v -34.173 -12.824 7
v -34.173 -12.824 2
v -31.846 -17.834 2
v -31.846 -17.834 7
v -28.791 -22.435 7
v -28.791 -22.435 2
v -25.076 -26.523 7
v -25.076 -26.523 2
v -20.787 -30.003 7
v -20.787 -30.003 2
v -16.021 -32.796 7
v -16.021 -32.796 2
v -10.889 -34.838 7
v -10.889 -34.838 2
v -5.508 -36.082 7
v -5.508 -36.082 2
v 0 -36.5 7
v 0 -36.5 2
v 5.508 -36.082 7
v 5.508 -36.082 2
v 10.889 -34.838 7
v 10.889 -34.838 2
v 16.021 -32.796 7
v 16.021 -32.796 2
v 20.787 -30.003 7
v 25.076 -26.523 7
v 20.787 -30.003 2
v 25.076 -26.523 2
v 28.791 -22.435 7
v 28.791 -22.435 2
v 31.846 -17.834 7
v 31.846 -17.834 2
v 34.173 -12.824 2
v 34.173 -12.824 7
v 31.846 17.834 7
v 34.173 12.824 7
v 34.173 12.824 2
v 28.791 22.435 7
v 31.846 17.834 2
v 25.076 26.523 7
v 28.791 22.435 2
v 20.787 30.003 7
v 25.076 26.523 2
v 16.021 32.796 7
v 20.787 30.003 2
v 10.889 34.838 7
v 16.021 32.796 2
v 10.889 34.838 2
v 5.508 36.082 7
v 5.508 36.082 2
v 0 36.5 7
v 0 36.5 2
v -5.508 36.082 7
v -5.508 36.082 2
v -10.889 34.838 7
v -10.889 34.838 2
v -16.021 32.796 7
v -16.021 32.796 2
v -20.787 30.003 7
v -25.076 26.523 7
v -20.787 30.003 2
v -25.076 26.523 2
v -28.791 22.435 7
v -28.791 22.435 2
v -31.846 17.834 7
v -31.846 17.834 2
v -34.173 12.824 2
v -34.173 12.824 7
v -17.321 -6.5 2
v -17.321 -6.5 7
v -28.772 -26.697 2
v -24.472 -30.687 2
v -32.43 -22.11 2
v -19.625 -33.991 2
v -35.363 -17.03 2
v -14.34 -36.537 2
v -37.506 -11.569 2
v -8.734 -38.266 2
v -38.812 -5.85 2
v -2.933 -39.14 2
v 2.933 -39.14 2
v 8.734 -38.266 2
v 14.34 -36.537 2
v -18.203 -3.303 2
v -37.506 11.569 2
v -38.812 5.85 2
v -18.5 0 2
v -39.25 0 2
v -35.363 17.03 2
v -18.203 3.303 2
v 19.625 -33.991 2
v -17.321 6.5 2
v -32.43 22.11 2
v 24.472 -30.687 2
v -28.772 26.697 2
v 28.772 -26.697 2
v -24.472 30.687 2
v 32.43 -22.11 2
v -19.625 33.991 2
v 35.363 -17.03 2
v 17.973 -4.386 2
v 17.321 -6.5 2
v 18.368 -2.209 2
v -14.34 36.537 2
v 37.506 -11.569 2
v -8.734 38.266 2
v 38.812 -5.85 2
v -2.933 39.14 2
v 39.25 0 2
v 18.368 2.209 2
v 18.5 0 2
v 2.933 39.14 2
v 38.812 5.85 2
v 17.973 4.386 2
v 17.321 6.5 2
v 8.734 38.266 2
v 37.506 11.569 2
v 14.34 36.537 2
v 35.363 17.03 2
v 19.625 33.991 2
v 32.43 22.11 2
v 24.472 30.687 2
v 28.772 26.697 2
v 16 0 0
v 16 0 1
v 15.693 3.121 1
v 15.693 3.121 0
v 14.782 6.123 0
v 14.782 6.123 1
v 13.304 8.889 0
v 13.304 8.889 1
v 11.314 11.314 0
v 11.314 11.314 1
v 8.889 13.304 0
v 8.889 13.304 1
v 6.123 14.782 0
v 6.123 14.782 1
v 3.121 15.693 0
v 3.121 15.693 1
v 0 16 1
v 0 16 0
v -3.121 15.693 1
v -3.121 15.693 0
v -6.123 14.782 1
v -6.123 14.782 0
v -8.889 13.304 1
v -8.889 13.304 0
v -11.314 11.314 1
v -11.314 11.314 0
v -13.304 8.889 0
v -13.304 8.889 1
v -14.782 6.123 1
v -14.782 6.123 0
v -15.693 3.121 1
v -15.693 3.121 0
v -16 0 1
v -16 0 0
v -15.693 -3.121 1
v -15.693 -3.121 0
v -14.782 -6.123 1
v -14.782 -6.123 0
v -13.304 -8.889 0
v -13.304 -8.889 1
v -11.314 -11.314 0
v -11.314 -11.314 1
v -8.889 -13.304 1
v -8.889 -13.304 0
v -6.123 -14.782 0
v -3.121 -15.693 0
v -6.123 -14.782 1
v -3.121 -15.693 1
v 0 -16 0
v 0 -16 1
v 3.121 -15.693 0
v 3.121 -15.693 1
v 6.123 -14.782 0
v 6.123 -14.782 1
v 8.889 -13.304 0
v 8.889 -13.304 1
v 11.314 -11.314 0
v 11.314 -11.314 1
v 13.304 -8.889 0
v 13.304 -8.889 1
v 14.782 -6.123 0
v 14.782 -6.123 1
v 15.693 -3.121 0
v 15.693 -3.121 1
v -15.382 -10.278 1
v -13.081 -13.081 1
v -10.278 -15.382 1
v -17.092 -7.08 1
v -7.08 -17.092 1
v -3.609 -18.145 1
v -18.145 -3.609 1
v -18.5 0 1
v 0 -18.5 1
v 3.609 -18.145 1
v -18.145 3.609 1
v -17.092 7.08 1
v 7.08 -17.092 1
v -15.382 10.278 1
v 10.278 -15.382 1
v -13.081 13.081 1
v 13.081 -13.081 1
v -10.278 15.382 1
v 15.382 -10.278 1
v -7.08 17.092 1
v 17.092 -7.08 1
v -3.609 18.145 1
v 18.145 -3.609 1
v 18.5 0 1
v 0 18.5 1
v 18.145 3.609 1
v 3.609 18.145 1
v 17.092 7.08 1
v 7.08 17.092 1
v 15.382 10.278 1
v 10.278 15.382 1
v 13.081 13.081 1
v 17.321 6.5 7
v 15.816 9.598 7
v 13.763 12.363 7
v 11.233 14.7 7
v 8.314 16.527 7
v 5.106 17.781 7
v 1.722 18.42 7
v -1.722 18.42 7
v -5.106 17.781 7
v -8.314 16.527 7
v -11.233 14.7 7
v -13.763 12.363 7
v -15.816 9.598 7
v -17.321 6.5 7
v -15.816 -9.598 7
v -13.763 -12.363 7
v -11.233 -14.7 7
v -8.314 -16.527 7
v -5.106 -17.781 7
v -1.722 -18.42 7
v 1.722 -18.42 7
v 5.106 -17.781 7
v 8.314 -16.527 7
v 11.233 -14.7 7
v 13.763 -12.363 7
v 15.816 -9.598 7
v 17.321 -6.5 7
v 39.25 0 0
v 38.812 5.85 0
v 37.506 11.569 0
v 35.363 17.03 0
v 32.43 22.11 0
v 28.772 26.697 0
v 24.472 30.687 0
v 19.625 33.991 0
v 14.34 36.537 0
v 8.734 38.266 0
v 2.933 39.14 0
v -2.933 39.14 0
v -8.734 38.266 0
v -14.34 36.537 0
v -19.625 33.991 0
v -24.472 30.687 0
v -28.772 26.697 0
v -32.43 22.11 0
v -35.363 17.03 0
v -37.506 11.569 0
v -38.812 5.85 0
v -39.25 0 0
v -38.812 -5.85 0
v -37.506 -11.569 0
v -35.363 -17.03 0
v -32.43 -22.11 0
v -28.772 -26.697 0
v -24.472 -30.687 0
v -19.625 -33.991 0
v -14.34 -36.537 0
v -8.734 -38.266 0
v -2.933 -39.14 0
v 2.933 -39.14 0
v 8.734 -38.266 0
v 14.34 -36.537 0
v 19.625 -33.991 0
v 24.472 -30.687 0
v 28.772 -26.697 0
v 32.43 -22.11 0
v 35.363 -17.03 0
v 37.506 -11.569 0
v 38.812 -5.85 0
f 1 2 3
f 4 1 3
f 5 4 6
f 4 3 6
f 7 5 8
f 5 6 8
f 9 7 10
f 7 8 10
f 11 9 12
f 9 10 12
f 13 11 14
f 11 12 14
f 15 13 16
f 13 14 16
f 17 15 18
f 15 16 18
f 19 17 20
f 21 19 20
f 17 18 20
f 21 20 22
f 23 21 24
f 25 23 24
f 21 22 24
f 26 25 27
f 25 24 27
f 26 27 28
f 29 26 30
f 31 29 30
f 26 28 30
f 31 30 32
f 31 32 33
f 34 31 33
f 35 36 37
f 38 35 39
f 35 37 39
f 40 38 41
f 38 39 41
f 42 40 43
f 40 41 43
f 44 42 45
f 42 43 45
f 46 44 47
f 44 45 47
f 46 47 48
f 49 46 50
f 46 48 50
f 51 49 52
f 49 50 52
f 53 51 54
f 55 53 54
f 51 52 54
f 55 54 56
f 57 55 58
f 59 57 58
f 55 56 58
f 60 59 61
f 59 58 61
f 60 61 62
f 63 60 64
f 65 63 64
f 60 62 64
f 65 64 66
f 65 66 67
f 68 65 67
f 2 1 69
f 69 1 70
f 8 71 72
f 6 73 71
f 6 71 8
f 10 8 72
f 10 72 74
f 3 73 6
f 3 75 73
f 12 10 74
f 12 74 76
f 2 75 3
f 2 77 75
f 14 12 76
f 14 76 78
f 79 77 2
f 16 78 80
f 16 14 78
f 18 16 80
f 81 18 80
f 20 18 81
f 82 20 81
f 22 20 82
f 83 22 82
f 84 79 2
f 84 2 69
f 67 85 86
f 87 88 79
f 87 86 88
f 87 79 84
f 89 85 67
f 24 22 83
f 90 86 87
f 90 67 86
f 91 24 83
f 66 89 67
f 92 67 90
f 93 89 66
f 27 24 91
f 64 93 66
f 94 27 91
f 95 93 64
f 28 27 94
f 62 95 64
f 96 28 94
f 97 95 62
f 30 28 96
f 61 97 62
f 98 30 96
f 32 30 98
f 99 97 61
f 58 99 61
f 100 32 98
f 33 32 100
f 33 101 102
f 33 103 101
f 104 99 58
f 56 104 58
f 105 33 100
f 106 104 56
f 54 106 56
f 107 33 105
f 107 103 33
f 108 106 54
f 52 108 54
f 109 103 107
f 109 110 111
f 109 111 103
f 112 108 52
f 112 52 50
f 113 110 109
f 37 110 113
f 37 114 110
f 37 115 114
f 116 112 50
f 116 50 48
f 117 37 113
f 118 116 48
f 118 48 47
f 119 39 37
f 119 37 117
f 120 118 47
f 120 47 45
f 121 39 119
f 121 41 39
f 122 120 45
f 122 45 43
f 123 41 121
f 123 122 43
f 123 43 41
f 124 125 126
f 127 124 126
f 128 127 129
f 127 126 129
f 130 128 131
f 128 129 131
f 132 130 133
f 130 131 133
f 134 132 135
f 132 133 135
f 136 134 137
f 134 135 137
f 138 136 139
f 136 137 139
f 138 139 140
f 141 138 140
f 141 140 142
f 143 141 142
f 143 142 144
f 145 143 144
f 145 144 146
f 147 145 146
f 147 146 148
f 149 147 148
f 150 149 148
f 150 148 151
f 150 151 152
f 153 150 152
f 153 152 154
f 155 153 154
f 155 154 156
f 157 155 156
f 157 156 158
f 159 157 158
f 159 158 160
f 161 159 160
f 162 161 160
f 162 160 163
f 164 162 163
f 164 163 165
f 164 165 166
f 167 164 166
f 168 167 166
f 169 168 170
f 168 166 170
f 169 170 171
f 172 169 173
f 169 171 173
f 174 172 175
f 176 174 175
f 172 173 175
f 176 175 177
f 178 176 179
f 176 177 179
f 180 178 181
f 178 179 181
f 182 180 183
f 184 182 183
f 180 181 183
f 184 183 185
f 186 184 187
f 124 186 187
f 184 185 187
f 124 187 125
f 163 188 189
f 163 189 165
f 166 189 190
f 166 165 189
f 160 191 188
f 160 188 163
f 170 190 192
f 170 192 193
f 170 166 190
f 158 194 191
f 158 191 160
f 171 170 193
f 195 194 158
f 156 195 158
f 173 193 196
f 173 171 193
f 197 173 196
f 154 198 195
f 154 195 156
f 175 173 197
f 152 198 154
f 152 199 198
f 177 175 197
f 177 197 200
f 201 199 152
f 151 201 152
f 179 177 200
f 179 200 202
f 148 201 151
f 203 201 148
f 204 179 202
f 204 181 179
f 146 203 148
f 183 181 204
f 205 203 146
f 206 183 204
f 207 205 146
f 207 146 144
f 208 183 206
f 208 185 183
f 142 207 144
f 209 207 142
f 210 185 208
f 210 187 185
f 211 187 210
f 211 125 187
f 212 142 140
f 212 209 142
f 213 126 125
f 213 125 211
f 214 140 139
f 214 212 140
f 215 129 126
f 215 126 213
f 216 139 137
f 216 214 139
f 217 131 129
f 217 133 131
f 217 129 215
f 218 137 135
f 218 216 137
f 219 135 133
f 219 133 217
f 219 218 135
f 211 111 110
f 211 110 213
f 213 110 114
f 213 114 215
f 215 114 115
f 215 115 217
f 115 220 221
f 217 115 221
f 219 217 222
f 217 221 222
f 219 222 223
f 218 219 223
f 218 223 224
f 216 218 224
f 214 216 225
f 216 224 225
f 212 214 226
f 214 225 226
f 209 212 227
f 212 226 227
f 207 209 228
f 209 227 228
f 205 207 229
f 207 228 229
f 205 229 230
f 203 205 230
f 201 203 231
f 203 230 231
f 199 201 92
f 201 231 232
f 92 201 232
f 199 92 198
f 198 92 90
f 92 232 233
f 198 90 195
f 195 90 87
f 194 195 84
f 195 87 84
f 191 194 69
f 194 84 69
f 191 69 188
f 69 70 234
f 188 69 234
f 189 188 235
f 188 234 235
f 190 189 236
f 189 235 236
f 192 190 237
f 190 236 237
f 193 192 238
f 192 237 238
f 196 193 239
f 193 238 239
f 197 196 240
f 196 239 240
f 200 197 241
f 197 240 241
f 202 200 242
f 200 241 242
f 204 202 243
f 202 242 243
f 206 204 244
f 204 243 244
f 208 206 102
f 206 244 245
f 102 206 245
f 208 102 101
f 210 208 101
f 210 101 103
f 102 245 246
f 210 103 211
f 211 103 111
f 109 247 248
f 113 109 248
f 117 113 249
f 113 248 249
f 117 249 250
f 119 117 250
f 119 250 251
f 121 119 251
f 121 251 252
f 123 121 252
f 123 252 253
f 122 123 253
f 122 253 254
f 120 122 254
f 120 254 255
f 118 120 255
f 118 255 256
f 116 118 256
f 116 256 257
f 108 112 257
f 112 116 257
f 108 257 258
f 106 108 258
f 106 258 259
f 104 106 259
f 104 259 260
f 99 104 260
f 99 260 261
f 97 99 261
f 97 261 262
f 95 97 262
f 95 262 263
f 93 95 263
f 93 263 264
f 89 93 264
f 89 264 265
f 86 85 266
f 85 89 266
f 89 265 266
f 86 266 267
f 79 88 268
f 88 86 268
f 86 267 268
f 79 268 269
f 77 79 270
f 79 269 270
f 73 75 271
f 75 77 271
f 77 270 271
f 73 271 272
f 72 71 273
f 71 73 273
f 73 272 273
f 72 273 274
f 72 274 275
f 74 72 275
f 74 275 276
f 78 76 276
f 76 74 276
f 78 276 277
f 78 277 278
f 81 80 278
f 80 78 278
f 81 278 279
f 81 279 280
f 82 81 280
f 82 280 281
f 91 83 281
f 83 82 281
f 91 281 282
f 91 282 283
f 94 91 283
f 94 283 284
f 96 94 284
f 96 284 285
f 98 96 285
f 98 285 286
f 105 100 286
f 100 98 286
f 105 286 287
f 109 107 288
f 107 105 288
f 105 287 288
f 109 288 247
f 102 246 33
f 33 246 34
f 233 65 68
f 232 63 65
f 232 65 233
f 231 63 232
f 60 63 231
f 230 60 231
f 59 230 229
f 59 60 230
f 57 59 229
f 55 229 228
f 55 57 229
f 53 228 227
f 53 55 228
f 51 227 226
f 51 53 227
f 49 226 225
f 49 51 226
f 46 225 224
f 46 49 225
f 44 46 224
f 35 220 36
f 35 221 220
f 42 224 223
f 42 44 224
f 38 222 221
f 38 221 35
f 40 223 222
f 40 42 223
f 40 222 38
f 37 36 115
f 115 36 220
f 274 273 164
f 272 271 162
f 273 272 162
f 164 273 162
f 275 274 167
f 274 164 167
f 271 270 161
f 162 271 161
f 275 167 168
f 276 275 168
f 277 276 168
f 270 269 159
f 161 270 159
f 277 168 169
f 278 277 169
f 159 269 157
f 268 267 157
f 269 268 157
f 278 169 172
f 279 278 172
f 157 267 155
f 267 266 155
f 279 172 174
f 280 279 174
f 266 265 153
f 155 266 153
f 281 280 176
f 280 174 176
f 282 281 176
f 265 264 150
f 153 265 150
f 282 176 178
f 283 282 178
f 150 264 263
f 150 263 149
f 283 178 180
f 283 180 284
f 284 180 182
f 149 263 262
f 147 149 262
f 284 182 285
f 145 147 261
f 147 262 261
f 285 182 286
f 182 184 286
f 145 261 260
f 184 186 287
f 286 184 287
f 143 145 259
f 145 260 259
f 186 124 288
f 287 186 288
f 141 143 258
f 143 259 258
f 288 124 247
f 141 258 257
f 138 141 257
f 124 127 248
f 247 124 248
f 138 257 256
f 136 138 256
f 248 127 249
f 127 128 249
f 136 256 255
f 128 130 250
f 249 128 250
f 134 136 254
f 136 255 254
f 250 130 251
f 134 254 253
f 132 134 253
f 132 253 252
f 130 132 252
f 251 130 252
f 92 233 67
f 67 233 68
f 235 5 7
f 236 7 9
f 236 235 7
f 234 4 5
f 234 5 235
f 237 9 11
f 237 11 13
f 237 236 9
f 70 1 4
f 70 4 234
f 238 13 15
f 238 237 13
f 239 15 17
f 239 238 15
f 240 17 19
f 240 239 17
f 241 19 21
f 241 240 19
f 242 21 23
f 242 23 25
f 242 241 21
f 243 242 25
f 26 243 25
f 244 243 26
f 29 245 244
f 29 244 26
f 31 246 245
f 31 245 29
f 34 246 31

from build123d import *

# Parameters (mm, degrees)
F0_R     = 36.5
F0_R_2   = 31.5
F1_DEPTH = 7
F0_R_3   = 39.25
F2_DEPTH = 2
F3_R     = 18.5
F3_R_2   = 16
F4_DEPTH = 6
F5_DEPTH = 25
F7_DEPTH = 5


with BuildPart() as f1:
    # F0 (on Top) → F1 (new body)
    with BuildSketch(Plane.XY):
        Circle(F0_R)
        Circle(F0_R_2, mode=Mode.SUBTRACT)
        Circle(F0_R_2)
    extrude(amount=F1_DEPTH)

    # F0 (on Top) → F2 (join)
    with BuildSketch(Plane.XY):
        Circle(F0_R_3)
        Circle(F0_R, mode=Mode.SUBTRACT)
        Circle(F0_R)
        Circle(F0_R_2, mode=Mode.SUBTRACT)
    extrude(amount=F2_DEPTH)

    # F3 (on face) → F4 (cut)
    with BuildSketch(Plane.XY.offset(7)):
        Circle(F3_R)
        Circle(F3_R_2, mode=Mode.SUBTRACT)
        Circle(F3_R_2)
    extrude(amount=-F4_DEPTH, mode=Mode.SUBTRACT)

    # F3 (on face) → F5 (cut)
    with BuildSketch(Plane.XY.offset(7)):
        Circle(F3_R_2)
    extrude(amount=-F5_DEPTH, mode=Mode.SUBTRACT)

    # F6 (on face) → F7 (cut)
    with BuildSketch(Plane.XY.offset(7)):
        Polygon((17.3205080757, -6.5), (40, -6.5), (40, 6.5), (17.3205080757, 6.5), (-17.3205080757, 6.5), (-40, 6.5), (-40, -6.5), (-17.3205080757, -6.5), align=None)
        with BuildLine():
            Line((-35.9165699921, 6.5), (-17.3205080757, 6.5))
            Line((-17.3205080757, 6.5), (-34.1728943115, 12.8243243243))
            ThreePointArc((-34.1728943115, 12.8243243243), (-35.1871073141, 9.7014163331), (-35.9165699921, 6.5))
        make_face()
        with BuildLine():
            Line((-34.1728943115, -12.8243243243), (-17.3205080757, -6.5))
            Line((-17.3205080757, -6.5), (-35.9165699921, -6.5))
            ThreePointArc((-35.9165699921, -6.5), (-35.1871073141, -9.7014163331), (-34.1728943115, -12.8243243243))
        make_face()
        with BuildLine():
            Line((35.9165699921, -6.5), (17.3205080757, -6.5))
            Line((17.3205080757, -6.5), (34.1728943115, -12.8243243243))
            ThreePointArc((34.1728943115, -12.8243243243), (35.1871073141, -9.7014163331), (35.9165699921, -6.5))
        make_face()
        with BuildLine():
            Line((34.1728943115, 12.8243243243), (17.3205080757, 6.5))
            Line((17.3205080757, 6.5), (35.9165699921, 6.5))
            ThreePointArc((35.9165699921, 6.5), (35.1871073141, 9.7014163331), (34.1728943115, 12.8243243243))
        make_face()
    extrude(amount=-F7_DEPTH, mode=Mode.SUBTRACT)


solid = f1.part
